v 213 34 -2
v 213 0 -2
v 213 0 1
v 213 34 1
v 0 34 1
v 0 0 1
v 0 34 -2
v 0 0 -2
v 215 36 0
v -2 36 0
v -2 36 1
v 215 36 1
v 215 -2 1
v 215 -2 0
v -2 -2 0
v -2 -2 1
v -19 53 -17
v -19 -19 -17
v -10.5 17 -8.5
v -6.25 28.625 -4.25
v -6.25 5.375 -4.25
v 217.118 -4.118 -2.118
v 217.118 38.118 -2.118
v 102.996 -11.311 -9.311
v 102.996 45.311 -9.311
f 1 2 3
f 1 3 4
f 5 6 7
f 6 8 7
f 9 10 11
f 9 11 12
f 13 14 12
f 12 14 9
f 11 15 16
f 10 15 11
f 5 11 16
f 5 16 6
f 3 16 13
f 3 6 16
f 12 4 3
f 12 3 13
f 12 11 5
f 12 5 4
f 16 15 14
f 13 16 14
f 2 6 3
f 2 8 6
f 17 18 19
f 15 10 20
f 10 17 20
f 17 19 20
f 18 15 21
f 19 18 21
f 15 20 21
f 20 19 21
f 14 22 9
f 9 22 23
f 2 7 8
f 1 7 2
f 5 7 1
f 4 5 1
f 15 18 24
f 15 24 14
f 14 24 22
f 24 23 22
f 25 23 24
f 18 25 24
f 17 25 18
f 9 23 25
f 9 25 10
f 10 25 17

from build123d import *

# Parameters (mm, degrees)
F0_W          = 217
F0_H          = 38
F0_W_2        = 213
F0_H_2        = 34
F1_DEPTH      = 1
F2_DEPTH      = 17
F2_TAPER      = -45
F3_DEPTH      = 2
F5_DEPTH      = 53.0010001
F5_DEPTH_BACK = 25


with BuildPart() as f1:
    # F0 (on Top) → F1 (new body)
    with BuildSketch(Plane.XY):
        with Locations((106.5, 17)):
            Rectangle(F0_W, F0_H)
        with Locations((106.5, 17)):
            Rectangle(F0_W_2, F0_H_2, mode=Mode.SUBTRACT)
    extrude(amount=F1_DEPTH)

    # F0 (on Top) → F2 (join)
    with BuildSketch(Plane.XY):
        with Locations((106.5, 17)):
            Rectangle(F0_W, F0_H)
        with Locations((106.5, 17)):
            Rectangle(F0_W_2, F0_H_2, mode=Mode.SUBTRACT)
        with Locations((106.5, 17)):
            Rectangle(F0_W_2, F0_H_2)
    extrude(amount=-F2_DEPTH, taper=F2_TAPER)

    # F0 (on Top) → F3 (cut)
    with BuildSketch(Plane.XY):
        with Locations((106.5, 17)):
            Rectangle(F0_W_2, F0_H_2)
    extrude(amount=-F3_DEPTH, mode=Mode.SUBTRACT)

    # F4 (on Front) → F5 (cut, two sides)
    with BuildSketch(Plane.XZ) as f5_sk:
        Polygon((217.1184106235, -2.1184106235), (-19, -17), (234.9526717854, -19.9526717854), align=None)
    extrude(amount=-F5_DEPTH, mode=Mode.SUBTRACT)
    extrude(f5_sk.sketch, amount=F5_DEPTH_BACK, mode=Mode.SUBTRACT)


solid = f1.part
